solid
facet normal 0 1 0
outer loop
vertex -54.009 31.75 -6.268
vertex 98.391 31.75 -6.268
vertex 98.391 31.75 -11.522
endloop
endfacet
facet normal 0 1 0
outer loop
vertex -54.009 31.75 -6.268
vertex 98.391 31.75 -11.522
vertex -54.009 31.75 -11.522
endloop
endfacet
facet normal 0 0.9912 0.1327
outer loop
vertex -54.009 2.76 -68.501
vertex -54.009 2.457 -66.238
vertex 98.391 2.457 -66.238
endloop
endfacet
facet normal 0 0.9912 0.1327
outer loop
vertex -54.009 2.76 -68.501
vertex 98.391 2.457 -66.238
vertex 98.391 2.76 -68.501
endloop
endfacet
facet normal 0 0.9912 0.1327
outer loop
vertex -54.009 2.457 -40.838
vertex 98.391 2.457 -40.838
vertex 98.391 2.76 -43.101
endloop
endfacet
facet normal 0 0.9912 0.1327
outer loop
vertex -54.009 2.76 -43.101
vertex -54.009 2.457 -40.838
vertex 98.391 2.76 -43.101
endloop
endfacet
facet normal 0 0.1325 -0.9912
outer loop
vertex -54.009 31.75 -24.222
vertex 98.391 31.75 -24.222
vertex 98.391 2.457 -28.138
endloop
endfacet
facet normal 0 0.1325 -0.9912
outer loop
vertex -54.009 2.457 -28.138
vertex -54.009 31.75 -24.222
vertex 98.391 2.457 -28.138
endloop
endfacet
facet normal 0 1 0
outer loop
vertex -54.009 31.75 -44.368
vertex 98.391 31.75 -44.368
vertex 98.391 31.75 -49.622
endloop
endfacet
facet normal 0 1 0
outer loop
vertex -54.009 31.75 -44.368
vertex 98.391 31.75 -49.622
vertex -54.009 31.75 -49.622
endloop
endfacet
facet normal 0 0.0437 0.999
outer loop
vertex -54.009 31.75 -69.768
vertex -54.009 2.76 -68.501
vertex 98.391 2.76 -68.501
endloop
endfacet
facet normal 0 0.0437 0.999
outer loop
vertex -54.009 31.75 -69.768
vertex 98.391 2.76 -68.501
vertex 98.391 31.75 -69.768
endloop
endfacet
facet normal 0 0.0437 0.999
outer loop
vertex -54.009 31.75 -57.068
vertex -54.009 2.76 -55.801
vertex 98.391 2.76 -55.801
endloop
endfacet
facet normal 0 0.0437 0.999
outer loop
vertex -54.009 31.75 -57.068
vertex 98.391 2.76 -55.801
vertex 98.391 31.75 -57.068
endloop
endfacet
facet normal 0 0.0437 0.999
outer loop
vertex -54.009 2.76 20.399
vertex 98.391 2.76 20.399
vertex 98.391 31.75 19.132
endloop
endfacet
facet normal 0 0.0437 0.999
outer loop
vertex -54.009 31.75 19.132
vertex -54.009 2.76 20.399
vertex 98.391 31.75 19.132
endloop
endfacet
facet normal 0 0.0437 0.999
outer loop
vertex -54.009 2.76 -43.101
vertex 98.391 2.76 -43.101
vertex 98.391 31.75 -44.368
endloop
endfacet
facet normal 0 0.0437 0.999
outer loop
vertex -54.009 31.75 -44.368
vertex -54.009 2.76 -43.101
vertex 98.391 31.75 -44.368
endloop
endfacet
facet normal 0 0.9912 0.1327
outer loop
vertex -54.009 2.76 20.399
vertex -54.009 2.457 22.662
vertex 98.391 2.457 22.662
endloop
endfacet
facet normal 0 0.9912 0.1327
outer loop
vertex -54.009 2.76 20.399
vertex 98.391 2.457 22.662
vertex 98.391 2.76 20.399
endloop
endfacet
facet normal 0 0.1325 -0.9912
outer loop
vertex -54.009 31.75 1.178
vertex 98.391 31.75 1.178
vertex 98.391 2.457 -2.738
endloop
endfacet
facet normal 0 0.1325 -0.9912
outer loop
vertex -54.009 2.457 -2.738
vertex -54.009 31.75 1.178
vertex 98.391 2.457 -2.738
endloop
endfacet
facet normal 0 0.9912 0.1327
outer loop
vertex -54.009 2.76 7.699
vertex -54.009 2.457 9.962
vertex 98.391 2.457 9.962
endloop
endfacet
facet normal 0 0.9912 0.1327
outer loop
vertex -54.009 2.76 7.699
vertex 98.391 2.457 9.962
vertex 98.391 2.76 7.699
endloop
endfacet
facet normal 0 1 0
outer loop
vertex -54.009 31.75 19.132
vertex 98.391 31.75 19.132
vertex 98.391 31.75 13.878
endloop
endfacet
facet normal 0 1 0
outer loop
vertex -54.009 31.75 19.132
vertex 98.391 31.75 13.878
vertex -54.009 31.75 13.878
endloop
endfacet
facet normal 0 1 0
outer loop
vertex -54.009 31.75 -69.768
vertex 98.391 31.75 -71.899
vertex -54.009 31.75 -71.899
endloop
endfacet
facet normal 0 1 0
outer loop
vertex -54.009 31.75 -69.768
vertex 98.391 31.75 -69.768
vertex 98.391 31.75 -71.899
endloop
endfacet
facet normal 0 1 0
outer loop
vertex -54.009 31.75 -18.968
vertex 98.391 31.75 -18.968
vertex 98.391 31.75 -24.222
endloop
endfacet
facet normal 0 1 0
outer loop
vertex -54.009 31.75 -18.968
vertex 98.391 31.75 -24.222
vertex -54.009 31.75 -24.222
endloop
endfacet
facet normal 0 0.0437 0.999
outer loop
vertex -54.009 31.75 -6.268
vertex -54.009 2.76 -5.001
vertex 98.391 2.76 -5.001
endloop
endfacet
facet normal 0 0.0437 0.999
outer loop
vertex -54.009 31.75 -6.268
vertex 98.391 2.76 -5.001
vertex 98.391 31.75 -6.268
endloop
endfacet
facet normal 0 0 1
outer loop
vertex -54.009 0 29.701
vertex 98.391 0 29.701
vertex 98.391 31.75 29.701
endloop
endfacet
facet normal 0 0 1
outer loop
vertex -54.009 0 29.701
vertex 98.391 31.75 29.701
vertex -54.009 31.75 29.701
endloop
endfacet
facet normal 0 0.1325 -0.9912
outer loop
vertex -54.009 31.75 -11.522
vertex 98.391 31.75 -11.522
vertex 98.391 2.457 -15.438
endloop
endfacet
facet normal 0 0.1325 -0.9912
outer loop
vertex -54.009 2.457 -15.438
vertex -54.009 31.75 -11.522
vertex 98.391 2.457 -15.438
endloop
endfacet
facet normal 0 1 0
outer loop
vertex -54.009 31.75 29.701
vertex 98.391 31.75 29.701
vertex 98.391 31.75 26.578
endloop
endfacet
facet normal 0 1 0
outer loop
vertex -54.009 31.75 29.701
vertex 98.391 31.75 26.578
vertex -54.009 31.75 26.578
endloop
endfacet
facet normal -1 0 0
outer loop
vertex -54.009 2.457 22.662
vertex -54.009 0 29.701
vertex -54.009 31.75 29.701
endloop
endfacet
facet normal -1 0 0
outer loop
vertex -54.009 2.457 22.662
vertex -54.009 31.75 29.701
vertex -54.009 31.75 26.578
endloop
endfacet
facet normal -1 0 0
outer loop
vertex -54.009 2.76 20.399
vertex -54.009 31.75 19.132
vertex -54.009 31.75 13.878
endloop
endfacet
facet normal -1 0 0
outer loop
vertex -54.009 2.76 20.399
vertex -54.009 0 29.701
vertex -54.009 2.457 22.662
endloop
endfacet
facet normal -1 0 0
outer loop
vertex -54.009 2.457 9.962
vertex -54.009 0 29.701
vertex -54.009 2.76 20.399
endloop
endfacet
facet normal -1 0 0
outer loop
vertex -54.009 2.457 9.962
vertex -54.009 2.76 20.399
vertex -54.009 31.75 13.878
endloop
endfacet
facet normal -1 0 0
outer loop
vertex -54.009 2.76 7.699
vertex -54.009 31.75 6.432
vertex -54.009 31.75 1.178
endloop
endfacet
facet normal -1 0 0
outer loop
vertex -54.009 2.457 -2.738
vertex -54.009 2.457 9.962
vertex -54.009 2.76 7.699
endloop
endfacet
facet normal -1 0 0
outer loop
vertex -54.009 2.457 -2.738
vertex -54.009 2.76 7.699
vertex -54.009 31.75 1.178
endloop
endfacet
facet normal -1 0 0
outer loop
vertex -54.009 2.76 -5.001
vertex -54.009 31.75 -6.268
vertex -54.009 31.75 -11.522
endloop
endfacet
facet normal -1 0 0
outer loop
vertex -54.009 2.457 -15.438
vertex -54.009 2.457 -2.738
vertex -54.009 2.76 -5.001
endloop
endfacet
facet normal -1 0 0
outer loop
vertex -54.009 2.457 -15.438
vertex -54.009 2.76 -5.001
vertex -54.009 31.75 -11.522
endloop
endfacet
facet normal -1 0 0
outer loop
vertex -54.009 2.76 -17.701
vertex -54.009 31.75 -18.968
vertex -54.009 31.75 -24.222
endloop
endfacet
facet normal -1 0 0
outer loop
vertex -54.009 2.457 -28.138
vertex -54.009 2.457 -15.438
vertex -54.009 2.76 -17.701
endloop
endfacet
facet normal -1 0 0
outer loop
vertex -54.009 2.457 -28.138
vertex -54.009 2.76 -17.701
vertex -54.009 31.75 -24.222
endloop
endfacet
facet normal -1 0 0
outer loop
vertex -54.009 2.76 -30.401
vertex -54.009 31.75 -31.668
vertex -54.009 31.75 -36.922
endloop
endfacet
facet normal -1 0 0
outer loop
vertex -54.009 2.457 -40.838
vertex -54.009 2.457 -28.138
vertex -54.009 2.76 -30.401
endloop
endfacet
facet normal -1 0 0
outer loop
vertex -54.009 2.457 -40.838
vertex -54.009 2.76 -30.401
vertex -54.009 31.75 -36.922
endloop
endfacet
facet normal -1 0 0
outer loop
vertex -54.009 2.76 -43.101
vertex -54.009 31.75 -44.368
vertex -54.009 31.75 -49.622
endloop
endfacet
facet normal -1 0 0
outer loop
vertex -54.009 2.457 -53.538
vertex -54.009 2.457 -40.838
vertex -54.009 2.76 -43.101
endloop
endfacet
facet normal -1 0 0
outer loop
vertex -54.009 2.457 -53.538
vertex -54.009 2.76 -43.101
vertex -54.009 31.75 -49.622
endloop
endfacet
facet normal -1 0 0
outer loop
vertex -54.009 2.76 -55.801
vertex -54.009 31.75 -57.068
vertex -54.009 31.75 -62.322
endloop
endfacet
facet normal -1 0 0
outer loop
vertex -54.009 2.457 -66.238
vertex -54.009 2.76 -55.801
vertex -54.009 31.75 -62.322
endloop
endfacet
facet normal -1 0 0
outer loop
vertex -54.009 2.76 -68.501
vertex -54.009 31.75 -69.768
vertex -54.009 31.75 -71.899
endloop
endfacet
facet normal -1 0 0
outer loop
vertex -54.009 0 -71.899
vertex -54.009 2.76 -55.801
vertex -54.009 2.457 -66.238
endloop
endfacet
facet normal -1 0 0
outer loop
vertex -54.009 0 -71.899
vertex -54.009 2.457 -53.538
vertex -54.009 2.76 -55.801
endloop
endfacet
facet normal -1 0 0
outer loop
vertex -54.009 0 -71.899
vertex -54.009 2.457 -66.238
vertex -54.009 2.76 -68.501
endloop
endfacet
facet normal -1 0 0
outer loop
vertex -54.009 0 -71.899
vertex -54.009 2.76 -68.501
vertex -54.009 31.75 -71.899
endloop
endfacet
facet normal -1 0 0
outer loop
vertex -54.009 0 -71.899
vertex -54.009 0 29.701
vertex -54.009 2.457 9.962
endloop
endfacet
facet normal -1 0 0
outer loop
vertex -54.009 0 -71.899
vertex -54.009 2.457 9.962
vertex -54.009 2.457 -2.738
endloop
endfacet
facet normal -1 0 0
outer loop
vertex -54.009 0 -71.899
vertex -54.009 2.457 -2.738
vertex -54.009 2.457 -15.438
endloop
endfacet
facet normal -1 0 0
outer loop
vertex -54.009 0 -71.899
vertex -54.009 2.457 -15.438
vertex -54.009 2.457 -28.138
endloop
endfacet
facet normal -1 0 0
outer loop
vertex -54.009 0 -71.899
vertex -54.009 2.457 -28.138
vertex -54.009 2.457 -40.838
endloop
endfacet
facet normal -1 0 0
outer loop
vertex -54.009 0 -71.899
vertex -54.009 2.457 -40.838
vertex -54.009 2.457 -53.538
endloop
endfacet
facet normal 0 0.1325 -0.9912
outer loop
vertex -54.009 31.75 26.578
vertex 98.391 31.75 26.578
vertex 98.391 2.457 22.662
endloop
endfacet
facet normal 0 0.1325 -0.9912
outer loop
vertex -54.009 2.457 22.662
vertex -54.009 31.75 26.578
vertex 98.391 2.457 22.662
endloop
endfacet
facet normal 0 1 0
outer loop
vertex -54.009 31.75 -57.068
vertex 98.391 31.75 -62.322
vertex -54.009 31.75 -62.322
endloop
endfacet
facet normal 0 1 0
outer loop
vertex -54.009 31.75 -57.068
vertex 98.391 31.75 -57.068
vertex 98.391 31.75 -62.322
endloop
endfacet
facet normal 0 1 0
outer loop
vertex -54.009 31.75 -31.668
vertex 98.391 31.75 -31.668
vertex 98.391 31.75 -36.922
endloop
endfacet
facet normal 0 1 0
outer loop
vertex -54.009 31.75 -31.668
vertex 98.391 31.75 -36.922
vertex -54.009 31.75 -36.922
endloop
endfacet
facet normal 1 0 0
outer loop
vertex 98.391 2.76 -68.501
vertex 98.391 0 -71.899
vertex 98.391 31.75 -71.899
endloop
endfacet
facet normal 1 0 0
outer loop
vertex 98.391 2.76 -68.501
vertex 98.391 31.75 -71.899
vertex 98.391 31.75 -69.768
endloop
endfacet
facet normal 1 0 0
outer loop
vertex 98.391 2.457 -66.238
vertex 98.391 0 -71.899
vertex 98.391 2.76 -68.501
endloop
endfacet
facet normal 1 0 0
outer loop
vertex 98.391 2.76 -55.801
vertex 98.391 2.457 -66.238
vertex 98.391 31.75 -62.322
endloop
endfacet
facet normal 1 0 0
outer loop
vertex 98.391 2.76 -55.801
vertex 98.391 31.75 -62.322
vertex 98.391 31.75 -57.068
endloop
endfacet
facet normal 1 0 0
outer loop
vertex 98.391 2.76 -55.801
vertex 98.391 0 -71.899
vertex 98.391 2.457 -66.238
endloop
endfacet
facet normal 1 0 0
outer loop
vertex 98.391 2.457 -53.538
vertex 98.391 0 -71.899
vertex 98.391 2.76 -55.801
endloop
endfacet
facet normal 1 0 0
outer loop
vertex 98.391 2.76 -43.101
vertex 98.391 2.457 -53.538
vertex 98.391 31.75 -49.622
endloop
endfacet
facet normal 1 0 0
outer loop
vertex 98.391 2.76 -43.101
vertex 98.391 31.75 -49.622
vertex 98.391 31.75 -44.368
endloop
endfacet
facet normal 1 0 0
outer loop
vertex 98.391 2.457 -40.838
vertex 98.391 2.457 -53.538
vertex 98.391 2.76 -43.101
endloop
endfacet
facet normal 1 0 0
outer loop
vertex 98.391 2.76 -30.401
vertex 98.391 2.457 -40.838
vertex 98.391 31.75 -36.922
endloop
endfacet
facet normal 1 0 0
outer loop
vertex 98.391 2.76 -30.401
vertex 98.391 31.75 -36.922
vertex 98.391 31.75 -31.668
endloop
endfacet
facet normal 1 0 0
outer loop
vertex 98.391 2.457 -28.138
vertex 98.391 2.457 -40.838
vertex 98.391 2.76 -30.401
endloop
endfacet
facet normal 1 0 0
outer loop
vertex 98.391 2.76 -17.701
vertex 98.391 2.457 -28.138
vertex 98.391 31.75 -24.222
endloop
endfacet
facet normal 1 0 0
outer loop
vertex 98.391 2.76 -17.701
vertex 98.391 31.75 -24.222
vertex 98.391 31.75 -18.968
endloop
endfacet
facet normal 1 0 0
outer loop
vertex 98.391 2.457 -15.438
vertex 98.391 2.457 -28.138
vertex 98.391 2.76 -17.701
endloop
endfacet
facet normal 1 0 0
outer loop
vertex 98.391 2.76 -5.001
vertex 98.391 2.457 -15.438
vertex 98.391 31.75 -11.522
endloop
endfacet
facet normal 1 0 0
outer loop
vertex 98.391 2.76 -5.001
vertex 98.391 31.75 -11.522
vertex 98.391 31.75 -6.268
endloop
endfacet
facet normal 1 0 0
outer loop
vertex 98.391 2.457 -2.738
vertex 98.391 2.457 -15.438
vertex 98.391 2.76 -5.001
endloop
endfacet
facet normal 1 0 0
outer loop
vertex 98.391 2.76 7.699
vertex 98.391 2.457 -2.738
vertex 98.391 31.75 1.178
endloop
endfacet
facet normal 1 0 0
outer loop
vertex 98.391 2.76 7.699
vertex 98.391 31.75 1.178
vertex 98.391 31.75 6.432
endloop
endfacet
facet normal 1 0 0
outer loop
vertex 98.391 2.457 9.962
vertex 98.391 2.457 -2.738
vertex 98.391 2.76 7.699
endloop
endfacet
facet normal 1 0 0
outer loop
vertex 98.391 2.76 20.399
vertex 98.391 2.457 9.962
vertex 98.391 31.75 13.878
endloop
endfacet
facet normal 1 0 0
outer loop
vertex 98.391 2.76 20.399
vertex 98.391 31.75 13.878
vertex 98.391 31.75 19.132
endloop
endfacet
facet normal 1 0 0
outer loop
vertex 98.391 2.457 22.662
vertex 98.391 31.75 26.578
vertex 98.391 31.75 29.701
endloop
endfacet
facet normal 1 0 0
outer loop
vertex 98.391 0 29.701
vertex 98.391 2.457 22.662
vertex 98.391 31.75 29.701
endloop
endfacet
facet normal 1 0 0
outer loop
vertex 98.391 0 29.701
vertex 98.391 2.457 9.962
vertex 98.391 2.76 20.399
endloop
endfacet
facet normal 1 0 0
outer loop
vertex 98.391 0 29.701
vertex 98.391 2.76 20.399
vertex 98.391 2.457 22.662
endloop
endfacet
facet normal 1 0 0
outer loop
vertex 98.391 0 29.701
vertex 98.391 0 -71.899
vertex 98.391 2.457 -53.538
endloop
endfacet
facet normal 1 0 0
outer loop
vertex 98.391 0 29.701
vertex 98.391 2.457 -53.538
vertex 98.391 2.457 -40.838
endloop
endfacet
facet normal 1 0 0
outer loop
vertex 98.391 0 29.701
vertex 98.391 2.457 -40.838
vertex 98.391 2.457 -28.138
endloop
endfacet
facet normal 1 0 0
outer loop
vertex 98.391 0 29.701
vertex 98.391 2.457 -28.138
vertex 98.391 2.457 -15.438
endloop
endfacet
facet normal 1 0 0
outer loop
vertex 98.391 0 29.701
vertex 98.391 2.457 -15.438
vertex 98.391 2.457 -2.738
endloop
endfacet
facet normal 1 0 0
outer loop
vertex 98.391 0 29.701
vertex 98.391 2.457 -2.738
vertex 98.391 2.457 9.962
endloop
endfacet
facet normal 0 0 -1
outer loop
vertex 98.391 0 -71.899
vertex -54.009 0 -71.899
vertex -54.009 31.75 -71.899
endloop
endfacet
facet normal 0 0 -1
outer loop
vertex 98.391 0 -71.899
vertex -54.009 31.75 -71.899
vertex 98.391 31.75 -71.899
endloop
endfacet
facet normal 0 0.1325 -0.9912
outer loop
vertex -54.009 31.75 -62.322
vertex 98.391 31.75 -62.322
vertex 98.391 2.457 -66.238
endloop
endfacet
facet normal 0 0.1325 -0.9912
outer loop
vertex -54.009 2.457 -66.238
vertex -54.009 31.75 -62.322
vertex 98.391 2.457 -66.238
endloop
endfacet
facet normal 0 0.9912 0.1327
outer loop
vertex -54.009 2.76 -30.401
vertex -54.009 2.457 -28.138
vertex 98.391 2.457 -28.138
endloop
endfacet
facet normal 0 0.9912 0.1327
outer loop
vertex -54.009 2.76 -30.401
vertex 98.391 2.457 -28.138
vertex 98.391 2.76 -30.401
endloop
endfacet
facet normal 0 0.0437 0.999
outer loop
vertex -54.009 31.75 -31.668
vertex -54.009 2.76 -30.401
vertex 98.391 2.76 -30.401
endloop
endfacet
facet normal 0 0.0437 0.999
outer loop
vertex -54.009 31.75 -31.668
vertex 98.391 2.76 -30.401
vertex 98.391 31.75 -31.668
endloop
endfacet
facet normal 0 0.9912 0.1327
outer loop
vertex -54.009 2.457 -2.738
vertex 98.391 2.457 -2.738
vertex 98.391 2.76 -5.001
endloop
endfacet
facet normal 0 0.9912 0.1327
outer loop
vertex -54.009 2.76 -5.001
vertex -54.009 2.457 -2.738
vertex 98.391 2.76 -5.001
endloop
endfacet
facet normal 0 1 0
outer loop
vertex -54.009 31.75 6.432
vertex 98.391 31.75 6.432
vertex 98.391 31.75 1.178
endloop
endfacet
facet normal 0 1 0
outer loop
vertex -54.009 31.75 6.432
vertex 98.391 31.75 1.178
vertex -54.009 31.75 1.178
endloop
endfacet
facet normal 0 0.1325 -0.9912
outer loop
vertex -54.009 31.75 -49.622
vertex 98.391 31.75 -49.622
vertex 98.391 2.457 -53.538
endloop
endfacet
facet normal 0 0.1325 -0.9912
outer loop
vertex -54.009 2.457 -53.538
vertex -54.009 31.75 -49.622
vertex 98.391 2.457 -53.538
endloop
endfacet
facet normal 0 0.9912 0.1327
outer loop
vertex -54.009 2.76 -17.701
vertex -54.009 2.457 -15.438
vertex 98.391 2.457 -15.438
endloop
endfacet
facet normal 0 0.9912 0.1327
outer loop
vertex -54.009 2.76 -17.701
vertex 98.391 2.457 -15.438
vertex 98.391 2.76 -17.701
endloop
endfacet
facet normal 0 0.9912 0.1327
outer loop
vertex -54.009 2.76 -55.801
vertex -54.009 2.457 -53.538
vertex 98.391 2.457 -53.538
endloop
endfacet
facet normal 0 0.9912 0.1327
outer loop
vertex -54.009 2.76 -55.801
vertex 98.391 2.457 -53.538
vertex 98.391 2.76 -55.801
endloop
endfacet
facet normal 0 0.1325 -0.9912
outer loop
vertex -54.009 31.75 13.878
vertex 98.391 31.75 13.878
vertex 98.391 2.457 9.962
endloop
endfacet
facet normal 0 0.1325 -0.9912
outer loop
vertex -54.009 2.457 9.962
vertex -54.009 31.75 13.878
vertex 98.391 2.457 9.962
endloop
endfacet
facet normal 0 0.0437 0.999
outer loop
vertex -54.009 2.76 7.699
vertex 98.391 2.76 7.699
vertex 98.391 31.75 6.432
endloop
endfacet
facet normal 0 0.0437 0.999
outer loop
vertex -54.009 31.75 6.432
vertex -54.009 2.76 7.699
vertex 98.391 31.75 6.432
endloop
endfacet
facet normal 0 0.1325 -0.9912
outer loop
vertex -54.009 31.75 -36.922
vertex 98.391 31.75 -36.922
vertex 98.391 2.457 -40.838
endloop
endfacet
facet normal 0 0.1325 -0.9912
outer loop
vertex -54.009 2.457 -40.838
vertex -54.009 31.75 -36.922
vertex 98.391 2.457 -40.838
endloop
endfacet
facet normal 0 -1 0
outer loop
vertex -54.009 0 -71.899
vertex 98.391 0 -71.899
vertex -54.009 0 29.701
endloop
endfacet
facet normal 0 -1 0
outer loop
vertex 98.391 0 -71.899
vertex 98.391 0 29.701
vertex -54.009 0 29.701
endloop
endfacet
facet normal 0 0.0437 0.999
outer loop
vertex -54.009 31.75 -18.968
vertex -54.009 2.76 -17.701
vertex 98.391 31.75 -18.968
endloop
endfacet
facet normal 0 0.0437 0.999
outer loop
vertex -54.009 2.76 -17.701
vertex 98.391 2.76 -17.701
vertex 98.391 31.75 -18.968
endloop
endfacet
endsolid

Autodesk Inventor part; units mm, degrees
ref_plane "YZ Plane" through (0, 0, 0) normal (1, 0, 0) x (0, 1, 0)
ref_plane "XZ Plane" through (0, 0, 0) normal (0, 1, 0) x (-1, 0, 0)
ref_plane "XY Plane" through (0, 0, 0) normal (0, 0, 1) x (1, 0, 0)
sketch "Sketch1" plane through (0, 0, 0) normal (0, 1, 0) x (-1, 0, 0)
  line L0 (-98.3907, 29.7008) -> (54.0093, 29.7008)
  line L1 (54.0093, 29.7008) -> (54.0093, -71.8992)
  line L2 (54.0093, -71.8992) -> (-98.3907, -71.8992)
  line L3 (-98.3907, -71.8992) -> (-98.3907, 29.7008)
  point P0 (0, 0)
  dimension "d0" = 152.4
  dimension "d1" = 101.6
extrude "Extrusion1" add sketch "Sketch1" along normal blind 31.75
sketch "Sketch2" plane through (98.3907, 0, 29.7008) normal (1, 0, 0) x (0, 0, -1)
  line L0 (0, 31.75) -> (101.6, 31.75) projected
  line L1 (2.6537, 35.2563) -> (7.0386, 2.4572)
  line L2 (7.0386, 2.4572) -> (9.3017, 2.7597)
  line L3 (9.3017, 2.7597) -> (10.7219, 35.2563)
  line L4 (10.7219, 35.2563) -> (2.6537, 35.2563)
  point P0 (29.7008, 0)
extrude "Extrusion2" cut sketch "Sketch2" against normal up to next
pattern_linear "Rectangular Pattern1" count 8 spacing 12.7 along (0, 0, -1) of "Extrusion2"
properties part number "HeatSink"
